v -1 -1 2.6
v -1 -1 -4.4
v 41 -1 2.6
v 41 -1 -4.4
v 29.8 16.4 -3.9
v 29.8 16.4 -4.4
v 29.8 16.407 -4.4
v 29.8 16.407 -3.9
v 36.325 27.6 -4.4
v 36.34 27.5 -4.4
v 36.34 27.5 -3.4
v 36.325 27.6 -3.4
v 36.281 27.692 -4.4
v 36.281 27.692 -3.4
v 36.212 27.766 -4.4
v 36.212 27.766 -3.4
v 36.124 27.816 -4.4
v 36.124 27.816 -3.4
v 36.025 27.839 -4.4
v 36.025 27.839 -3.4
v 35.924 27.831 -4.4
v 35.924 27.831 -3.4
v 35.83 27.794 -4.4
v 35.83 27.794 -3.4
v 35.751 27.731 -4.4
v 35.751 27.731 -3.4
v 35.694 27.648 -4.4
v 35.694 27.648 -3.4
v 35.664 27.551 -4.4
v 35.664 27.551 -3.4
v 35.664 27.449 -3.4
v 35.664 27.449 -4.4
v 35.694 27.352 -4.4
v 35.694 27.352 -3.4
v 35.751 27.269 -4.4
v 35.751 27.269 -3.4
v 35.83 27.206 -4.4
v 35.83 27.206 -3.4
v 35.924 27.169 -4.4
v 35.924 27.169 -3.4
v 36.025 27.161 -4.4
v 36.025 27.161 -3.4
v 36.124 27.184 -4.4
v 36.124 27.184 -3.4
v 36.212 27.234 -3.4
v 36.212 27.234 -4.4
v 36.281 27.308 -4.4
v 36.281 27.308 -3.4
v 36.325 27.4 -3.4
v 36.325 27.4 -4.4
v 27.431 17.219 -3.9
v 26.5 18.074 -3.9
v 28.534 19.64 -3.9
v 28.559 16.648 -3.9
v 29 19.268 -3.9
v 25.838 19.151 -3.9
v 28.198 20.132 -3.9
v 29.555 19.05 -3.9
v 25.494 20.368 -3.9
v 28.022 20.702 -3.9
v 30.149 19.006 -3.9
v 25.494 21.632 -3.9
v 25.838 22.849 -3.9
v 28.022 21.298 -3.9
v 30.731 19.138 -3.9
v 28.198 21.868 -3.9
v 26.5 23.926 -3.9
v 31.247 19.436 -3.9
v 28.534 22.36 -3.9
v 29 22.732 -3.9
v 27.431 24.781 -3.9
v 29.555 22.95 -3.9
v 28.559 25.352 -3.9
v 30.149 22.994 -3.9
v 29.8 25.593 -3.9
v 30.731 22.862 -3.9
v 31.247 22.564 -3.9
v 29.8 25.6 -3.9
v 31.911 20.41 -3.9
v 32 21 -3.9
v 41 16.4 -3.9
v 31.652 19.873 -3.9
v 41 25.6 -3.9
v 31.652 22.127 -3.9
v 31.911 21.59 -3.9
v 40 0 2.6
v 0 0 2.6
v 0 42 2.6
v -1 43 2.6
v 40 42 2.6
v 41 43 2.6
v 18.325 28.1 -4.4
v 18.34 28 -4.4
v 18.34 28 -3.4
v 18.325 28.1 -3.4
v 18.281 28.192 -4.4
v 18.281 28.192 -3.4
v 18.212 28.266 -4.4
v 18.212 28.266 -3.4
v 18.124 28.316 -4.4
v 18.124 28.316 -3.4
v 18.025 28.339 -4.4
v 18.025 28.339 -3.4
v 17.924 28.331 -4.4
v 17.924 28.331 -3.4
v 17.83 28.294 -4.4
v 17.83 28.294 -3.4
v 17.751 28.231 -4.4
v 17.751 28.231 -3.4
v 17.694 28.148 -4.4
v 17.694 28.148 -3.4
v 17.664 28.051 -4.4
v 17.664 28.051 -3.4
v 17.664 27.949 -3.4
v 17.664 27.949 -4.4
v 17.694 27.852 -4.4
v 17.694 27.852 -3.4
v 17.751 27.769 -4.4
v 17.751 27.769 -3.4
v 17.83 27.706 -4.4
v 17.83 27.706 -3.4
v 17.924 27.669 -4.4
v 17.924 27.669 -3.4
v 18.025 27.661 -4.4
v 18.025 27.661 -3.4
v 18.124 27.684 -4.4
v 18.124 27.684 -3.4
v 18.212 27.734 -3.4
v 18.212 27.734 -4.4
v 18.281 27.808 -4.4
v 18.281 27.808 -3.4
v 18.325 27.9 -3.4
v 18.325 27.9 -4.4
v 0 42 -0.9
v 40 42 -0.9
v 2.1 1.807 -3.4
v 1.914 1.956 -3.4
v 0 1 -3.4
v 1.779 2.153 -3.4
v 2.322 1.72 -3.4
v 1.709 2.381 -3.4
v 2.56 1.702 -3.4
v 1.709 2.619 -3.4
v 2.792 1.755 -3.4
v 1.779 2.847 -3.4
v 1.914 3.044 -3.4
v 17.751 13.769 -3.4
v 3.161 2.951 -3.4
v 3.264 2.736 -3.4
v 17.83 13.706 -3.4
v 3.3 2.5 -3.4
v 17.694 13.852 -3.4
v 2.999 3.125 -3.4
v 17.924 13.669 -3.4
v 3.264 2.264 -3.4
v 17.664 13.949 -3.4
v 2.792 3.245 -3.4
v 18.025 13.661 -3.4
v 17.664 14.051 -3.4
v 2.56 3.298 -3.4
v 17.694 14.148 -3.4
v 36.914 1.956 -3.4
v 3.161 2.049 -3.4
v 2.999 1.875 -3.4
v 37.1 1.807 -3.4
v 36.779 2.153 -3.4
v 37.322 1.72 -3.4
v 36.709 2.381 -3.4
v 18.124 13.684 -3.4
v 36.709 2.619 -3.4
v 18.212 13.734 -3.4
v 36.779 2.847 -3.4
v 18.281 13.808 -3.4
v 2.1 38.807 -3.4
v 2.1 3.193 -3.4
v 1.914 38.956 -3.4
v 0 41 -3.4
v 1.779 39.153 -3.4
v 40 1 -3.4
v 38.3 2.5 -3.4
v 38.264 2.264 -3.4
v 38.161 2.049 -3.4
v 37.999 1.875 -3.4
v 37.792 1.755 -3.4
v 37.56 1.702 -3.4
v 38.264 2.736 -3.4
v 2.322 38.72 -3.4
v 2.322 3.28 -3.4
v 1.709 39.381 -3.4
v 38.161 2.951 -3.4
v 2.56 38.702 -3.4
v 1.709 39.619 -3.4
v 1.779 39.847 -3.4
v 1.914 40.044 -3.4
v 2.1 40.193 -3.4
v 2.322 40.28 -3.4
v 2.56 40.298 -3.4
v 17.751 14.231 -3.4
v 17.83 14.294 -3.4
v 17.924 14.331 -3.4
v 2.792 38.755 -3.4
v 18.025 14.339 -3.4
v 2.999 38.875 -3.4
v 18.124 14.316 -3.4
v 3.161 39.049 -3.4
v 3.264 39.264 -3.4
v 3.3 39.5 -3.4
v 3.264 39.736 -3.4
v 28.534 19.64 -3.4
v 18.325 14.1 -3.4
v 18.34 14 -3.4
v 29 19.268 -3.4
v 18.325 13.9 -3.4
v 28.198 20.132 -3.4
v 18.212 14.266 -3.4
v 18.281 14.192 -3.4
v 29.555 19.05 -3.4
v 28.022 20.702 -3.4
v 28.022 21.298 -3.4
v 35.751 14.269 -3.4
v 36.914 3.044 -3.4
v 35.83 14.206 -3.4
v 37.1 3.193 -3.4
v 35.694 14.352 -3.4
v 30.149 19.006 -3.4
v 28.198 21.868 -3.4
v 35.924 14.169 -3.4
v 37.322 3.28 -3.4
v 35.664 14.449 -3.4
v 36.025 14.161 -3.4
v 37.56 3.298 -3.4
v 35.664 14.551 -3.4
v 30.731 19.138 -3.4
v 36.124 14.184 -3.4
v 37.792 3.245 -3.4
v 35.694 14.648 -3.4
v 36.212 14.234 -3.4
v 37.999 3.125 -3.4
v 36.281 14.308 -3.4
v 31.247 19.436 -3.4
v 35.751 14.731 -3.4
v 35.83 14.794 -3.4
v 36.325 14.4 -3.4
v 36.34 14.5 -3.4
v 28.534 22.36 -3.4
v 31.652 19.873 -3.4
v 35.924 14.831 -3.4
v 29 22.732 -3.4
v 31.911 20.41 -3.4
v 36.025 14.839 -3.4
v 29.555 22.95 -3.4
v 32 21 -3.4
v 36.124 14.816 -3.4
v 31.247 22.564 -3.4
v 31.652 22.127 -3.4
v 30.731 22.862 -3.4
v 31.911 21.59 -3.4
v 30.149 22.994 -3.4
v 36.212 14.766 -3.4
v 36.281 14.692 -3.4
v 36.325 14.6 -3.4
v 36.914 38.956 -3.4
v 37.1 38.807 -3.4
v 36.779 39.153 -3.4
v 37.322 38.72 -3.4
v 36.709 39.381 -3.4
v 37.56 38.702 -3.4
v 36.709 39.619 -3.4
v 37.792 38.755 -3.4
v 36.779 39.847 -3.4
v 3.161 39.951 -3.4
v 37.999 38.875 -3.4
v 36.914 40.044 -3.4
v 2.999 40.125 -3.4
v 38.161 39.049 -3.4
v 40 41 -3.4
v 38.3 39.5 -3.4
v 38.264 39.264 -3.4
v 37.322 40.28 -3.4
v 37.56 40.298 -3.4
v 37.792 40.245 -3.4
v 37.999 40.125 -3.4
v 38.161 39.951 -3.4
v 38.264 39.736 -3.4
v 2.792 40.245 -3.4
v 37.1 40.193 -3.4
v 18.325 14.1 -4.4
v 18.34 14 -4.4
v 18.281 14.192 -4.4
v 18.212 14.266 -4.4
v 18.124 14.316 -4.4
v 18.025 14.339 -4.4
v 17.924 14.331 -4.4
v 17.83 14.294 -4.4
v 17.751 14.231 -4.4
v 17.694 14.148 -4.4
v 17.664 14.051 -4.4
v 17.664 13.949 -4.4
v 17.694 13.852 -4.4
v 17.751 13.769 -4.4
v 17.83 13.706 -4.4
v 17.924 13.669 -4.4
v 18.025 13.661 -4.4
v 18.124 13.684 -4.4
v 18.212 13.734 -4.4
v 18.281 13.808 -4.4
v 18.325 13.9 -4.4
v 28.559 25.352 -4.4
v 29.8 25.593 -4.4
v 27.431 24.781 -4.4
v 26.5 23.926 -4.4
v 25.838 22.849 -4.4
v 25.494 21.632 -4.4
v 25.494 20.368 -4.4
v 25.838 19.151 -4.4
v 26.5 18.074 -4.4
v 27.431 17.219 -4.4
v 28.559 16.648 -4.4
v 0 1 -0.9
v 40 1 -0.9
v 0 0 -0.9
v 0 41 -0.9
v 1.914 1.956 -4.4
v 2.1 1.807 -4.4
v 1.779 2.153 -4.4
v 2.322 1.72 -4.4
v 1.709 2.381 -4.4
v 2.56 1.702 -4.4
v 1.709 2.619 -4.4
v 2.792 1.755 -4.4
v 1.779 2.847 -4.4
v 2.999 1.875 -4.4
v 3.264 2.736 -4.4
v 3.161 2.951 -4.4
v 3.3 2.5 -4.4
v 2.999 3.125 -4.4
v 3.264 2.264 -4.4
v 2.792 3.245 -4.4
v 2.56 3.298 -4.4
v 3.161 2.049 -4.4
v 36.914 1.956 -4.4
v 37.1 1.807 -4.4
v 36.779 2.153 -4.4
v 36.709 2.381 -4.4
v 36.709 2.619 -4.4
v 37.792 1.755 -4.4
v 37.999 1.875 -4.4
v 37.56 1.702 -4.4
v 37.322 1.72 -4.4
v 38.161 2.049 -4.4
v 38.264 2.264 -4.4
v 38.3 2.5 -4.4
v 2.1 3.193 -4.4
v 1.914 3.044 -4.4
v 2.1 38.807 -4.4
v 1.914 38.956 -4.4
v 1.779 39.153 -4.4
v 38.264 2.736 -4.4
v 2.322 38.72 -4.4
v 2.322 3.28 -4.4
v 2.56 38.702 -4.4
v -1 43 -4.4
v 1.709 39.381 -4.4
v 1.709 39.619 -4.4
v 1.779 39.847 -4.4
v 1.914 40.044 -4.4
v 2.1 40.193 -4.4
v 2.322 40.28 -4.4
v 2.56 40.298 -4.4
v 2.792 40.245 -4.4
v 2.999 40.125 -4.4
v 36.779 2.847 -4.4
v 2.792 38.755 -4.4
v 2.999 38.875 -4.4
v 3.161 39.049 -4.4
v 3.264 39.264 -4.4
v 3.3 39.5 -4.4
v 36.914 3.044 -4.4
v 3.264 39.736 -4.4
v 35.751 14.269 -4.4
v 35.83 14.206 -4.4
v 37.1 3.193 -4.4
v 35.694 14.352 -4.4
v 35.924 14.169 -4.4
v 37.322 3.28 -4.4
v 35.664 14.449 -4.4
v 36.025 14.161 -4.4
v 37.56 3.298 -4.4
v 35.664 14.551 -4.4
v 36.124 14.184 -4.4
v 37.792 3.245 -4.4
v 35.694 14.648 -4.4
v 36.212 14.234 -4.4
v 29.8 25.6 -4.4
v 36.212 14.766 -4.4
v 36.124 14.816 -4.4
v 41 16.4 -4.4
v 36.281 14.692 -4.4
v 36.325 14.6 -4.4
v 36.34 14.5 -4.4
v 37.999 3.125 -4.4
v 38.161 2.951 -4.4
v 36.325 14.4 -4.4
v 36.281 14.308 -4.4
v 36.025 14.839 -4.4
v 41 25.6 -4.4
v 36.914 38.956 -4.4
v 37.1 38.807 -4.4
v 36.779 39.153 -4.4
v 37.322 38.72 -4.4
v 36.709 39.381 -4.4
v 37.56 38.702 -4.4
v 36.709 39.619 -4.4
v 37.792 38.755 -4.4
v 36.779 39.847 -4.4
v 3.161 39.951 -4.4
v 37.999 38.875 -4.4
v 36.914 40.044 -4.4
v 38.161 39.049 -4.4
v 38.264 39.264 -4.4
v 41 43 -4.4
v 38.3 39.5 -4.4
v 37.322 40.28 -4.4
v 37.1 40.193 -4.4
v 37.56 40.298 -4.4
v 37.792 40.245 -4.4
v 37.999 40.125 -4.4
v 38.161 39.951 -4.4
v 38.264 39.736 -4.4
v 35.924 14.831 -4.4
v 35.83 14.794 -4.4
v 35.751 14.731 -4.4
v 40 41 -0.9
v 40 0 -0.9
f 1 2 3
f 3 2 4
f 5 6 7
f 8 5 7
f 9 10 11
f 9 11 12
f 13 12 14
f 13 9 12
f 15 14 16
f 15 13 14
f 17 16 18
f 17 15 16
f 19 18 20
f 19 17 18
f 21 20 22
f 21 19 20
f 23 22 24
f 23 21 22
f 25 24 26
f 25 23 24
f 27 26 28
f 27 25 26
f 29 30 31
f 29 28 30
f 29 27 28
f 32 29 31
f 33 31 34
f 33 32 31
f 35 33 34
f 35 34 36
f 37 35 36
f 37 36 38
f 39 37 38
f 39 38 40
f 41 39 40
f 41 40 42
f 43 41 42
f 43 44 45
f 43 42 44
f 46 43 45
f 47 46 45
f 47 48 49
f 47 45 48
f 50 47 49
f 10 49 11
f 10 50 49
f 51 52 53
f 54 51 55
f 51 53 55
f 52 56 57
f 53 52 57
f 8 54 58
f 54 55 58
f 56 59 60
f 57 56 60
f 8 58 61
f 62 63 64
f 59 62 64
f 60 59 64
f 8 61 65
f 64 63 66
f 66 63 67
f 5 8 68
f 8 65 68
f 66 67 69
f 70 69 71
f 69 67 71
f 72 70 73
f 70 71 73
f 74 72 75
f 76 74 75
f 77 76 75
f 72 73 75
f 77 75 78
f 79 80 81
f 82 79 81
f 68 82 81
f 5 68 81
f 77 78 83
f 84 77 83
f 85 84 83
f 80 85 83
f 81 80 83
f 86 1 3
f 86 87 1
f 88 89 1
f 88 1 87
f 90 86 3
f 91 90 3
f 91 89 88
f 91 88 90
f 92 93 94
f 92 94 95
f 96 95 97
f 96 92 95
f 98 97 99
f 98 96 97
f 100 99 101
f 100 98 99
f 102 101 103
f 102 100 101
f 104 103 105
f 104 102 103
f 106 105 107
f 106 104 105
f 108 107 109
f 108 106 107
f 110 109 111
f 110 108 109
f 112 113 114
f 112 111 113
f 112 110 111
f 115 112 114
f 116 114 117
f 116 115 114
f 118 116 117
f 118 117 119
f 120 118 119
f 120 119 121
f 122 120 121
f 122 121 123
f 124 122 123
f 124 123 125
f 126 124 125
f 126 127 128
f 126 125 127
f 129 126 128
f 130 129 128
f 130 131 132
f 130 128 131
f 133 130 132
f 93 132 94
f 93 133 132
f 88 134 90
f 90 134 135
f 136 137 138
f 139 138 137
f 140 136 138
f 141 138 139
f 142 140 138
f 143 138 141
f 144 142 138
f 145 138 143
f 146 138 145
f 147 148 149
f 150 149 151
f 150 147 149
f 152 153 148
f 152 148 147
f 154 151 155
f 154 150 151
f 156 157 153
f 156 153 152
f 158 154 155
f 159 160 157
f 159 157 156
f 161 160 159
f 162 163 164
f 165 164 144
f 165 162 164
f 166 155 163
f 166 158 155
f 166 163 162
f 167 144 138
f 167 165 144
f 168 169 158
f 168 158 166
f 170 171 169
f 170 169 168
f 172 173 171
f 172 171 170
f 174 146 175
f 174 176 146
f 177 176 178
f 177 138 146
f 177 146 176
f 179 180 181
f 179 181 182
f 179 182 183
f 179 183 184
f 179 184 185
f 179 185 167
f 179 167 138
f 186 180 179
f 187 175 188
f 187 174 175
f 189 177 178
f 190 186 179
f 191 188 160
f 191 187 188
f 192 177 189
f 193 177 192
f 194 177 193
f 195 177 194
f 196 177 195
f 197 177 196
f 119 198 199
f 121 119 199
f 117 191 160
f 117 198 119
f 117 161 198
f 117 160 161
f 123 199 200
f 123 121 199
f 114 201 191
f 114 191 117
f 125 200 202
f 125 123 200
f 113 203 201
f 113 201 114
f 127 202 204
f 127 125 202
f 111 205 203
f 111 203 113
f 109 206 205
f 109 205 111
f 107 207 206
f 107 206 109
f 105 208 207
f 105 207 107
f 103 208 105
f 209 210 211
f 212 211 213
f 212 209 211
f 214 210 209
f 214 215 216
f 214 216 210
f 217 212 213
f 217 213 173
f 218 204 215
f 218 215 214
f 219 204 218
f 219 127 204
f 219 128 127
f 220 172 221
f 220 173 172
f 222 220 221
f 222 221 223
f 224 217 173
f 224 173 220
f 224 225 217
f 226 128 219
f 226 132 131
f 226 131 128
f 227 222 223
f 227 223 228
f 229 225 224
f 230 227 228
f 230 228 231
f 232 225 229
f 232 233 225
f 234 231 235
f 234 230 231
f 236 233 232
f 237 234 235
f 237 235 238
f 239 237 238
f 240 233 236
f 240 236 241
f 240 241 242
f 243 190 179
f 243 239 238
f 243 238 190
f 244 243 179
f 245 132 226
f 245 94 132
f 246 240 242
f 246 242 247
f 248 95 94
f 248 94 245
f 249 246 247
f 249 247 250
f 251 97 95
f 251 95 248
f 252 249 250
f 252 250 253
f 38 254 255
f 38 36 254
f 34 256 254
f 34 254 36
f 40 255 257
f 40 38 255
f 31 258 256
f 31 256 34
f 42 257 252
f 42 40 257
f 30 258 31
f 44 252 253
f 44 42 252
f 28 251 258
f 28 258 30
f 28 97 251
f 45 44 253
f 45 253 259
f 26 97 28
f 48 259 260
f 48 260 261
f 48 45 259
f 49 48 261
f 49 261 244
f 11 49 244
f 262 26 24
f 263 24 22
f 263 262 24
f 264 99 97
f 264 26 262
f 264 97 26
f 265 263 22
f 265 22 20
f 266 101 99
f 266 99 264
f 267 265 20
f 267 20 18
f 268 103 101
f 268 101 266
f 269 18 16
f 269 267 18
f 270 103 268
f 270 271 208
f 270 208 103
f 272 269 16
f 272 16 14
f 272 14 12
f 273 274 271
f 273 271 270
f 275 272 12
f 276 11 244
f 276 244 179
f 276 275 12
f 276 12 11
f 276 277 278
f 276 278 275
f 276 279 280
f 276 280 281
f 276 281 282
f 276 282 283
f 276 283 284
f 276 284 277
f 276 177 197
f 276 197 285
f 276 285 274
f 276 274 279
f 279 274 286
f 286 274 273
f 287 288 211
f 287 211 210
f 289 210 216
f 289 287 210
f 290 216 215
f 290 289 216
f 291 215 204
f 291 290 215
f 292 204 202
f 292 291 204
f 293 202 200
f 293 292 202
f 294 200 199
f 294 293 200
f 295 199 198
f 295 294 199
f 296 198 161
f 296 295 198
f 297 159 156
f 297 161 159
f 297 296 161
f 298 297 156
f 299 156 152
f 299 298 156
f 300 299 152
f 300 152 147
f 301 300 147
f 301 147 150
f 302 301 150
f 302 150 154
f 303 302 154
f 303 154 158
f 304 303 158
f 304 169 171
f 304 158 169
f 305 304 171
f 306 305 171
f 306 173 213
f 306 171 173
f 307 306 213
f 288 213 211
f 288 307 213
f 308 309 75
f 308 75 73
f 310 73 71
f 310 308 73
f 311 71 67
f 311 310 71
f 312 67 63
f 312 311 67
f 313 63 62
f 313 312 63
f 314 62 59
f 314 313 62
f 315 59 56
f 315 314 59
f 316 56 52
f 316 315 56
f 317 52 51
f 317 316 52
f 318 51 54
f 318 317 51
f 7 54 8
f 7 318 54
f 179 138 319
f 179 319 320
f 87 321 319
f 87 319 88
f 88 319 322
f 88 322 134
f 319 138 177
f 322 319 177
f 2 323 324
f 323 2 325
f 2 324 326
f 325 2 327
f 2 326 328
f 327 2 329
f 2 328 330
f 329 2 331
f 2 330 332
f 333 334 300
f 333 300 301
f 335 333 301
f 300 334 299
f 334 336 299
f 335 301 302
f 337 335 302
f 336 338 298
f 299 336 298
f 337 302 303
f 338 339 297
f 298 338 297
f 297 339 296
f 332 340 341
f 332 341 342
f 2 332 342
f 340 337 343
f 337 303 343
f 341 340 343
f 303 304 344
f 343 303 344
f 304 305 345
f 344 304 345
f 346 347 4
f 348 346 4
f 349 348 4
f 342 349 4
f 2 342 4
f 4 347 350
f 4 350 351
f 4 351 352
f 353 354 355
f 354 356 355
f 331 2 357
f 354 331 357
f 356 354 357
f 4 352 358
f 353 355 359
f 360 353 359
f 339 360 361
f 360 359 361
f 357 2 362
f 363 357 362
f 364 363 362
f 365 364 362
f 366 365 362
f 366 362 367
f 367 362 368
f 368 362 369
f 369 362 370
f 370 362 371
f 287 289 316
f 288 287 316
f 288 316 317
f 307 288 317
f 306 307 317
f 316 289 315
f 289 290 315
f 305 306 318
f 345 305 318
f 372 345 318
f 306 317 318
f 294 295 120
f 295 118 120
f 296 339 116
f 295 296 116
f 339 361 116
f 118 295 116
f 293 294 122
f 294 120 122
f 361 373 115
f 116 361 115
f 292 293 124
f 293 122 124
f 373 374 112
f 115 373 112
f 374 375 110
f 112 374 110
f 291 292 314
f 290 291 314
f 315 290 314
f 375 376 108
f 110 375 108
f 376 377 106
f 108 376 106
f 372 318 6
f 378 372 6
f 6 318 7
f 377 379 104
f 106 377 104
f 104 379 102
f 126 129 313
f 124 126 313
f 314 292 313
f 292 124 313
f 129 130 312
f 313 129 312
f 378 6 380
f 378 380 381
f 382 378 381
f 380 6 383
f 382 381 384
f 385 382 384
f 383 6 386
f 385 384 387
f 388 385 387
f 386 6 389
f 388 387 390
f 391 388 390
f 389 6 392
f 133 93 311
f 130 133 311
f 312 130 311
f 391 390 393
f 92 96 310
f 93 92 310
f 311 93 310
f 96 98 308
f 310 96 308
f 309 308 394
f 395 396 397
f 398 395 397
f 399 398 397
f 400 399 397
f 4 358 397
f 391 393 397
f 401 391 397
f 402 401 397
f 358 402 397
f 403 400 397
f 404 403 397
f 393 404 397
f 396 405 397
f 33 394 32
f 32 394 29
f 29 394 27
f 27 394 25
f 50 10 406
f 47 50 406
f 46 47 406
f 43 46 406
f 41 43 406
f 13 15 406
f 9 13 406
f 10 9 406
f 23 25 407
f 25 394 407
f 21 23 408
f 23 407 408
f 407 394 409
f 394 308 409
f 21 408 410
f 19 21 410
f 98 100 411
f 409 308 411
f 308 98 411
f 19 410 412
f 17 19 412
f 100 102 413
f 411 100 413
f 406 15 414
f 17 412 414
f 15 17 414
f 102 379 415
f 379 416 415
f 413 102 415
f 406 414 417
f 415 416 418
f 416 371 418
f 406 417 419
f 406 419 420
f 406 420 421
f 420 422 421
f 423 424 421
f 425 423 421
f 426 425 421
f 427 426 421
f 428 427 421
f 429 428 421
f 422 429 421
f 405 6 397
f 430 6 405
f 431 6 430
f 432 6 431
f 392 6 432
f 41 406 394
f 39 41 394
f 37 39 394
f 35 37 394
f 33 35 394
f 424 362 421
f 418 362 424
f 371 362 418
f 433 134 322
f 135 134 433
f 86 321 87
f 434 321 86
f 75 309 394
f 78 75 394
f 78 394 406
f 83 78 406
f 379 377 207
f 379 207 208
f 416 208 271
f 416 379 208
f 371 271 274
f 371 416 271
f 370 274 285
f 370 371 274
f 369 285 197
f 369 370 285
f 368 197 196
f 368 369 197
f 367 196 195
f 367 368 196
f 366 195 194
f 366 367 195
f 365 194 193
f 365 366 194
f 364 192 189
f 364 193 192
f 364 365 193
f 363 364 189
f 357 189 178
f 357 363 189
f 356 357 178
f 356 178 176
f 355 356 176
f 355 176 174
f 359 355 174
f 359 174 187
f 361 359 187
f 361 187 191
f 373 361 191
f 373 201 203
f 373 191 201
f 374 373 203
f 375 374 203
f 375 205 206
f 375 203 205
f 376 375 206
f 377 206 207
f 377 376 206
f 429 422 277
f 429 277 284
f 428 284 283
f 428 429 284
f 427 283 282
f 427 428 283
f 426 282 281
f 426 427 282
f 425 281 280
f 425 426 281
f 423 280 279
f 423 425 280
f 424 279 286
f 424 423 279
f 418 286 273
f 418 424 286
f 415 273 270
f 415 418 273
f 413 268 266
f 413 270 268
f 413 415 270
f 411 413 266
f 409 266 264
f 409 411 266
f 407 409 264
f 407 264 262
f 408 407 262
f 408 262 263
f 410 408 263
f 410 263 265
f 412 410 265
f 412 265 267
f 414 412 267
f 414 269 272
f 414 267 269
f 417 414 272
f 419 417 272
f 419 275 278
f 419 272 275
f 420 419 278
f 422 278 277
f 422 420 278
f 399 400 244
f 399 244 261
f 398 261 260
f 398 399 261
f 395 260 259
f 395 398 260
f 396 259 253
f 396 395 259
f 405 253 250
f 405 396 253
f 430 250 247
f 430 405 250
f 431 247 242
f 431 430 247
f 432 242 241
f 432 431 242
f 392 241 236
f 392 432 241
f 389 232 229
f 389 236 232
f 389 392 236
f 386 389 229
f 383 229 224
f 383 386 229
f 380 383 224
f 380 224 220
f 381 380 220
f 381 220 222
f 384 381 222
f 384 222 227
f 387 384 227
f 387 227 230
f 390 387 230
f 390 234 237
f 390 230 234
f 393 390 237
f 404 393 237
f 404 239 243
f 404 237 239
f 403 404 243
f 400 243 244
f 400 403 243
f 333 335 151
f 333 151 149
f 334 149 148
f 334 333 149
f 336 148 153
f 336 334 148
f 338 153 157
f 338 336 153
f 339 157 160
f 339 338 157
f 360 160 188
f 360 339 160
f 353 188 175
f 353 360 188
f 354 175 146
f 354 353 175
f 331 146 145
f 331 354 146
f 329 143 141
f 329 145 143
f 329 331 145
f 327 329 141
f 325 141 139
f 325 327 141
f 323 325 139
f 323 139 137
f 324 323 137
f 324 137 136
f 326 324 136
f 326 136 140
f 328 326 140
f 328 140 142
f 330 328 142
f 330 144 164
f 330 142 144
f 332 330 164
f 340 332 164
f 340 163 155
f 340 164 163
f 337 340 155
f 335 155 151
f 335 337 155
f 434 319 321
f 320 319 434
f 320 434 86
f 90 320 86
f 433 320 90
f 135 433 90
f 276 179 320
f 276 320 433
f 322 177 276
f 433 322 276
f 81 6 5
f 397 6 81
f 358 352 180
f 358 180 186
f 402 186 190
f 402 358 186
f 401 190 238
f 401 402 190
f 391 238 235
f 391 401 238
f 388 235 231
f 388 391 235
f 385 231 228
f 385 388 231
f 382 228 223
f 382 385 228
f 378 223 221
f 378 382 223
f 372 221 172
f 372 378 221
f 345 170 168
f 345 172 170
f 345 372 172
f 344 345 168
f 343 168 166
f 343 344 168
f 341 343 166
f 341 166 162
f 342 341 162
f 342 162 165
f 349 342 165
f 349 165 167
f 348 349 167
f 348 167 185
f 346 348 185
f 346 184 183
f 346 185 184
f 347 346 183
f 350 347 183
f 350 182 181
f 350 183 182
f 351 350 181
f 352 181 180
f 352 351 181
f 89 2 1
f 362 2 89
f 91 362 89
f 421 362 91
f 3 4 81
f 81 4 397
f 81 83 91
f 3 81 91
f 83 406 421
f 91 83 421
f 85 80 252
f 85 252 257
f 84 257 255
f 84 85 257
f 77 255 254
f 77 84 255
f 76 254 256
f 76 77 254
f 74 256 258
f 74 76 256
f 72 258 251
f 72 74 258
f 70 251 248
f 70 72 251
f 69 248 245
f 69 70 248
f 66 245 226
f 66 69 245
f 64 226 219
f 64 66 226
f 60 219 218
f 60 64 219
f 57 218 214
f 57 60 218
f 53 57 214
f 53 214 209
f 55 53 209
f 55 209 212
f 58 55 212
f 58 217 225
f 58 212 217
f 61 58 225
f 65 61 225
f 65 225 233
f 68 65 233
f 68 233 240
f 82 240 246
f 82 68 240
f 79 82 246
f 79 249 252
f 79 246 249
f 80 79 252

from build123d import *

# Parameters (mm, degrees)
CYLINDER009_R     = 0.8
CYLINDER009_DEPTH = 20
CYLINDER010_R     = 0.8
CYLINDER010_DEPTH = 20
CYLINDER011_R     = 0.8
CYLINDER011_DEPTH = 20
CYLINDER008_R     = 0.8
CYLINDER008_DEPTH = 20
CYLINDER005_R     = 0.34
CYLINDER005_DEPTH = 100
CYLINDER006_R     = 0.34
CYLINDER006_DEPTH = 100
CYLINDER007_R     = 0.34
CYLINDER007_DEPTH = 100
CYLINDER004_R     = 0.34
CYLINDER004_DEPTH = 100
CYLINDER002_R     = 4.6
CYLINDER002_DEPTH = 0.5
CYLINDER003_R     = 4.6
CYLINDER003_DEPTH = 0.5
BOX008_W          = 18
BOX008_H          = 9.2
BOX008_DEPTH      = 0.5
BOX004_W          = 40
BOX004_H          = 1
BOX004_DEPTH      = 2.5
CYLINDER001_R     = 2
CYLINDER001_DEPTH = 20
BOX002_W          = 40
BOX002_H          = 42
BOX002_DEPTH      = 6
BOX001_W          = 42
BOX001_H          = 44
BOX001_DEPTH      = 7
BOX003_W          = 40
BOX003_H          = 1
BOX003_DEPTH      = 2.5


with BuildPart() as zylinder009:
    # Cylinder009 → Cylinder009 (new body)
    with BuildSketch(Plane(origin=(2.5, 2.5, -10), x_dir=(1, 0, 0), z_dir=(0, 0, 1))):
        Circle(CYLINDER009_R)
    extrude(amount=CYLINDER009_DEPTH)


with BuildPart() as zylinder010:
    # Cylinder010 → Cylinder010 (new body)
    with BuildSketch(Plane(origin=(37.5, 39.5, -10), x_dir=(1, 0, 0), z_dir=(0, 0, 1))):
        Circle(CYLINDER010_R)
    extrude(amount=CYLINDER010_DEPTH)


with BuildPart() as zylinder011:
    # Cylinder011 → Cylinder011 (new body)
    with BuildSketch(Plane(origin=(2.5, 39.5, -10), x_dir=(1, 0, 0), z_dir=(0, 0, 1))):
        Circle(CYLINDER011_R)
    extrude(amount=CYLINDER011_DEPTH)


with BuildPart() as compound005:
    # Cylinder008 → Cylinder008 (new body)
    with BuildSketch(Plane(origin=(37.5, 2.5, -10), x_dir=(1, 0, 0), z_dir=(0, 0, 1))):
        Circle(CYLINDER008_R)
    extrude(amount=CYLINDER008_DEPTH)

    # Compound005: union Zylinder009, Zylinder010, Zylinder011
    add(zylinder009.part)
    add(zylinder010.part)
    add(zylinder011.part)


with BuildPart() as zylinder005:
    # Cylinder005 → Cylinder005 (new body)
    with BuildSketch(Plane(origin=(18, 28, -50), x_dir=(1, 0, 0), z_dir=(0, 0, 1))):
        Circle(CYLINDER005_R)
    extrude(amount=CYLINDER005_DEPTH)


with BuildPart() as zylinder006:
    # Cylinder006 → Cylinder006 (new body)
    with BuildSketch(Plane(origin=(36, 14.5, -50), x_dir=(1, 0, 0), z_dir=(0, 0, 1))):
        Circle(CYLINDER006_R)
    extrude(amount=CYLINDER006_DEPTH)


with BuildPart() as zylinder007:
    # Cylinder007 → Cylinder007 (new body)
    with BuildSketch(Plane(origin=(36, 27.5, -50), x_dir=(1, 0, 0), z_dir=(0, 0, 1))):
        Circle(CYLINDER007_R)
    extrude(amount=CYLINDER007_DEPTH)


with BuildPart() as m1tapholes:
    # Cylinder004 → Cylinder004 (new body)
    with BuildSketch(Plane(origin=(18, 14, -50), x_dir=(1, 0, 0), z_dir=(0, 0, 1))):
        Circle(CYLINDER004_R)
    extrude(amount=CYLINDER004_DEPTH)

    # Compound002: union Zylinder005, Zylinder006, Zylinder007
    add(zylinder005.part)
    add(zylinder006.part)
    add(zylinder007.part)


with BuildPart() as zylinder002:
    # Cylinder002 → Cylinder002 (new body)
    with BuildSketch(Plane(origin=(27.75, 21, -4.4), x_dir=(1, 0, 0), z_dir=(0, 0, 1))):
        Circle(CYLINDER002_R)
    extrude(amount=CYLINDER002_DEPTH)


with BuildPart() as zylinder003:
    # Cylinder003 → Cylinder003 (new body)
    with BuildSketch(Plane(origin=(27.75, 21, -4.4), x_dir=(1, 0, 0), z_dir=(0, 0, 1))):
        Circle(CYLINDER003_R)
    extrude(amount=CYLINDER003_DEPTH)


with BuildPart() as fusion002:
    # Box008 → Box008 (new body)
    with BuildSketch(Plane(origin=(27.5, 16.4, -4.4), x_dir=(1, 0, 0), z_dir=(0, 0, 1))):
        with Locations((9, 4.6)):
            Rectangle(BOX008_W, BOX008_H)
    extrude(amount=BOX008_DEPTH)

    # Fusion002: union Zylinder002, Zylinder003
    add(zylinder002.part)
    add(zylinder003.part)


with BuildPart() as fusion002_1:
    # Fusion002 placement: moved
    add(fusion002.part.moved(Location((2.3, 0, 0))))


with BuildPart() as w_rfel004:
    # Box004 → Box004 (new body)
    with BuildSketch(Plane(origin=(0, 41, -3.4), x_dir=(1, 0, 0), z_dir=(0, 0, 1))):
        with Locations((20, 0.5)):
            Rectangle(BOX004_W, BOX004_H)
    extrude(amount=BOX004_DEPTH)


with BuildPart() as zylinder001:
    # Cylinder001 → Cylinder001 (new body)
    with BuildSketch(Plane(origin=(30, 21, -10), x_dir=(1, 0, 0), z_dir=(0, 0, 1))):
        Circle(CYLINDER001_R)
    extrude(amount=CYLINDER001_DEPTH)


with BuildPart() as w_rfel002:
    # Box002 → Box002 (new body)
    with BuildSketch(Plane.XY.offset(-3.4)):
        with Locations((20, 21)):
            Rectangle(BOX002_W, BOX002_H)
    extrude(amount=BOX002_DEPTH)


with BuildPart() as cut002:
    # Box001 → Box001 (new body)
    with BuildSketch(Plane(origin=(-1, -1, -4.4), x_dir=(1, 0, 0), z_dir=(0, 0, 1))):
        with Locations((21, 22)):
            Rectangle(BOX001_W, BOX001_H)
    extrude(amount=BOX001_DEPTH)

    # Cut001: cut Würfel002
    add(w_rfel002.part, mode=Mode.SUBTRACT)

    # Cut002: cut Zylinder001
    add(zylinder001.part, mode=Mode.SUBTRACT)


with BuildPart() as upperpart:
    # Box003 → Box003 (new body)
    with BuildSketch(Plane.XY.offset(-3.4)):
        with Locations((20, 0.5)):
            Rectangle(BOX003_W, BOX003_H)
    extrude(amount=BOX003_DEPTH)

    # Fusion: union Würfel004, Cut002
    add(w_rfel004.part)
    add(cut002.part)

    # Cut004: cut Fusion002
    add(fusion002_1.part, mode=Mode.SUBTRACT)

    # Cut005: cut M1TapHoles
    add(m1tapholes.part, mode=Mode.SUBTRACT)

    # Cut007: cut Compound005
    add(compound005.part, mode=Mode.SUBTRACT)


solid = upperpart.part
